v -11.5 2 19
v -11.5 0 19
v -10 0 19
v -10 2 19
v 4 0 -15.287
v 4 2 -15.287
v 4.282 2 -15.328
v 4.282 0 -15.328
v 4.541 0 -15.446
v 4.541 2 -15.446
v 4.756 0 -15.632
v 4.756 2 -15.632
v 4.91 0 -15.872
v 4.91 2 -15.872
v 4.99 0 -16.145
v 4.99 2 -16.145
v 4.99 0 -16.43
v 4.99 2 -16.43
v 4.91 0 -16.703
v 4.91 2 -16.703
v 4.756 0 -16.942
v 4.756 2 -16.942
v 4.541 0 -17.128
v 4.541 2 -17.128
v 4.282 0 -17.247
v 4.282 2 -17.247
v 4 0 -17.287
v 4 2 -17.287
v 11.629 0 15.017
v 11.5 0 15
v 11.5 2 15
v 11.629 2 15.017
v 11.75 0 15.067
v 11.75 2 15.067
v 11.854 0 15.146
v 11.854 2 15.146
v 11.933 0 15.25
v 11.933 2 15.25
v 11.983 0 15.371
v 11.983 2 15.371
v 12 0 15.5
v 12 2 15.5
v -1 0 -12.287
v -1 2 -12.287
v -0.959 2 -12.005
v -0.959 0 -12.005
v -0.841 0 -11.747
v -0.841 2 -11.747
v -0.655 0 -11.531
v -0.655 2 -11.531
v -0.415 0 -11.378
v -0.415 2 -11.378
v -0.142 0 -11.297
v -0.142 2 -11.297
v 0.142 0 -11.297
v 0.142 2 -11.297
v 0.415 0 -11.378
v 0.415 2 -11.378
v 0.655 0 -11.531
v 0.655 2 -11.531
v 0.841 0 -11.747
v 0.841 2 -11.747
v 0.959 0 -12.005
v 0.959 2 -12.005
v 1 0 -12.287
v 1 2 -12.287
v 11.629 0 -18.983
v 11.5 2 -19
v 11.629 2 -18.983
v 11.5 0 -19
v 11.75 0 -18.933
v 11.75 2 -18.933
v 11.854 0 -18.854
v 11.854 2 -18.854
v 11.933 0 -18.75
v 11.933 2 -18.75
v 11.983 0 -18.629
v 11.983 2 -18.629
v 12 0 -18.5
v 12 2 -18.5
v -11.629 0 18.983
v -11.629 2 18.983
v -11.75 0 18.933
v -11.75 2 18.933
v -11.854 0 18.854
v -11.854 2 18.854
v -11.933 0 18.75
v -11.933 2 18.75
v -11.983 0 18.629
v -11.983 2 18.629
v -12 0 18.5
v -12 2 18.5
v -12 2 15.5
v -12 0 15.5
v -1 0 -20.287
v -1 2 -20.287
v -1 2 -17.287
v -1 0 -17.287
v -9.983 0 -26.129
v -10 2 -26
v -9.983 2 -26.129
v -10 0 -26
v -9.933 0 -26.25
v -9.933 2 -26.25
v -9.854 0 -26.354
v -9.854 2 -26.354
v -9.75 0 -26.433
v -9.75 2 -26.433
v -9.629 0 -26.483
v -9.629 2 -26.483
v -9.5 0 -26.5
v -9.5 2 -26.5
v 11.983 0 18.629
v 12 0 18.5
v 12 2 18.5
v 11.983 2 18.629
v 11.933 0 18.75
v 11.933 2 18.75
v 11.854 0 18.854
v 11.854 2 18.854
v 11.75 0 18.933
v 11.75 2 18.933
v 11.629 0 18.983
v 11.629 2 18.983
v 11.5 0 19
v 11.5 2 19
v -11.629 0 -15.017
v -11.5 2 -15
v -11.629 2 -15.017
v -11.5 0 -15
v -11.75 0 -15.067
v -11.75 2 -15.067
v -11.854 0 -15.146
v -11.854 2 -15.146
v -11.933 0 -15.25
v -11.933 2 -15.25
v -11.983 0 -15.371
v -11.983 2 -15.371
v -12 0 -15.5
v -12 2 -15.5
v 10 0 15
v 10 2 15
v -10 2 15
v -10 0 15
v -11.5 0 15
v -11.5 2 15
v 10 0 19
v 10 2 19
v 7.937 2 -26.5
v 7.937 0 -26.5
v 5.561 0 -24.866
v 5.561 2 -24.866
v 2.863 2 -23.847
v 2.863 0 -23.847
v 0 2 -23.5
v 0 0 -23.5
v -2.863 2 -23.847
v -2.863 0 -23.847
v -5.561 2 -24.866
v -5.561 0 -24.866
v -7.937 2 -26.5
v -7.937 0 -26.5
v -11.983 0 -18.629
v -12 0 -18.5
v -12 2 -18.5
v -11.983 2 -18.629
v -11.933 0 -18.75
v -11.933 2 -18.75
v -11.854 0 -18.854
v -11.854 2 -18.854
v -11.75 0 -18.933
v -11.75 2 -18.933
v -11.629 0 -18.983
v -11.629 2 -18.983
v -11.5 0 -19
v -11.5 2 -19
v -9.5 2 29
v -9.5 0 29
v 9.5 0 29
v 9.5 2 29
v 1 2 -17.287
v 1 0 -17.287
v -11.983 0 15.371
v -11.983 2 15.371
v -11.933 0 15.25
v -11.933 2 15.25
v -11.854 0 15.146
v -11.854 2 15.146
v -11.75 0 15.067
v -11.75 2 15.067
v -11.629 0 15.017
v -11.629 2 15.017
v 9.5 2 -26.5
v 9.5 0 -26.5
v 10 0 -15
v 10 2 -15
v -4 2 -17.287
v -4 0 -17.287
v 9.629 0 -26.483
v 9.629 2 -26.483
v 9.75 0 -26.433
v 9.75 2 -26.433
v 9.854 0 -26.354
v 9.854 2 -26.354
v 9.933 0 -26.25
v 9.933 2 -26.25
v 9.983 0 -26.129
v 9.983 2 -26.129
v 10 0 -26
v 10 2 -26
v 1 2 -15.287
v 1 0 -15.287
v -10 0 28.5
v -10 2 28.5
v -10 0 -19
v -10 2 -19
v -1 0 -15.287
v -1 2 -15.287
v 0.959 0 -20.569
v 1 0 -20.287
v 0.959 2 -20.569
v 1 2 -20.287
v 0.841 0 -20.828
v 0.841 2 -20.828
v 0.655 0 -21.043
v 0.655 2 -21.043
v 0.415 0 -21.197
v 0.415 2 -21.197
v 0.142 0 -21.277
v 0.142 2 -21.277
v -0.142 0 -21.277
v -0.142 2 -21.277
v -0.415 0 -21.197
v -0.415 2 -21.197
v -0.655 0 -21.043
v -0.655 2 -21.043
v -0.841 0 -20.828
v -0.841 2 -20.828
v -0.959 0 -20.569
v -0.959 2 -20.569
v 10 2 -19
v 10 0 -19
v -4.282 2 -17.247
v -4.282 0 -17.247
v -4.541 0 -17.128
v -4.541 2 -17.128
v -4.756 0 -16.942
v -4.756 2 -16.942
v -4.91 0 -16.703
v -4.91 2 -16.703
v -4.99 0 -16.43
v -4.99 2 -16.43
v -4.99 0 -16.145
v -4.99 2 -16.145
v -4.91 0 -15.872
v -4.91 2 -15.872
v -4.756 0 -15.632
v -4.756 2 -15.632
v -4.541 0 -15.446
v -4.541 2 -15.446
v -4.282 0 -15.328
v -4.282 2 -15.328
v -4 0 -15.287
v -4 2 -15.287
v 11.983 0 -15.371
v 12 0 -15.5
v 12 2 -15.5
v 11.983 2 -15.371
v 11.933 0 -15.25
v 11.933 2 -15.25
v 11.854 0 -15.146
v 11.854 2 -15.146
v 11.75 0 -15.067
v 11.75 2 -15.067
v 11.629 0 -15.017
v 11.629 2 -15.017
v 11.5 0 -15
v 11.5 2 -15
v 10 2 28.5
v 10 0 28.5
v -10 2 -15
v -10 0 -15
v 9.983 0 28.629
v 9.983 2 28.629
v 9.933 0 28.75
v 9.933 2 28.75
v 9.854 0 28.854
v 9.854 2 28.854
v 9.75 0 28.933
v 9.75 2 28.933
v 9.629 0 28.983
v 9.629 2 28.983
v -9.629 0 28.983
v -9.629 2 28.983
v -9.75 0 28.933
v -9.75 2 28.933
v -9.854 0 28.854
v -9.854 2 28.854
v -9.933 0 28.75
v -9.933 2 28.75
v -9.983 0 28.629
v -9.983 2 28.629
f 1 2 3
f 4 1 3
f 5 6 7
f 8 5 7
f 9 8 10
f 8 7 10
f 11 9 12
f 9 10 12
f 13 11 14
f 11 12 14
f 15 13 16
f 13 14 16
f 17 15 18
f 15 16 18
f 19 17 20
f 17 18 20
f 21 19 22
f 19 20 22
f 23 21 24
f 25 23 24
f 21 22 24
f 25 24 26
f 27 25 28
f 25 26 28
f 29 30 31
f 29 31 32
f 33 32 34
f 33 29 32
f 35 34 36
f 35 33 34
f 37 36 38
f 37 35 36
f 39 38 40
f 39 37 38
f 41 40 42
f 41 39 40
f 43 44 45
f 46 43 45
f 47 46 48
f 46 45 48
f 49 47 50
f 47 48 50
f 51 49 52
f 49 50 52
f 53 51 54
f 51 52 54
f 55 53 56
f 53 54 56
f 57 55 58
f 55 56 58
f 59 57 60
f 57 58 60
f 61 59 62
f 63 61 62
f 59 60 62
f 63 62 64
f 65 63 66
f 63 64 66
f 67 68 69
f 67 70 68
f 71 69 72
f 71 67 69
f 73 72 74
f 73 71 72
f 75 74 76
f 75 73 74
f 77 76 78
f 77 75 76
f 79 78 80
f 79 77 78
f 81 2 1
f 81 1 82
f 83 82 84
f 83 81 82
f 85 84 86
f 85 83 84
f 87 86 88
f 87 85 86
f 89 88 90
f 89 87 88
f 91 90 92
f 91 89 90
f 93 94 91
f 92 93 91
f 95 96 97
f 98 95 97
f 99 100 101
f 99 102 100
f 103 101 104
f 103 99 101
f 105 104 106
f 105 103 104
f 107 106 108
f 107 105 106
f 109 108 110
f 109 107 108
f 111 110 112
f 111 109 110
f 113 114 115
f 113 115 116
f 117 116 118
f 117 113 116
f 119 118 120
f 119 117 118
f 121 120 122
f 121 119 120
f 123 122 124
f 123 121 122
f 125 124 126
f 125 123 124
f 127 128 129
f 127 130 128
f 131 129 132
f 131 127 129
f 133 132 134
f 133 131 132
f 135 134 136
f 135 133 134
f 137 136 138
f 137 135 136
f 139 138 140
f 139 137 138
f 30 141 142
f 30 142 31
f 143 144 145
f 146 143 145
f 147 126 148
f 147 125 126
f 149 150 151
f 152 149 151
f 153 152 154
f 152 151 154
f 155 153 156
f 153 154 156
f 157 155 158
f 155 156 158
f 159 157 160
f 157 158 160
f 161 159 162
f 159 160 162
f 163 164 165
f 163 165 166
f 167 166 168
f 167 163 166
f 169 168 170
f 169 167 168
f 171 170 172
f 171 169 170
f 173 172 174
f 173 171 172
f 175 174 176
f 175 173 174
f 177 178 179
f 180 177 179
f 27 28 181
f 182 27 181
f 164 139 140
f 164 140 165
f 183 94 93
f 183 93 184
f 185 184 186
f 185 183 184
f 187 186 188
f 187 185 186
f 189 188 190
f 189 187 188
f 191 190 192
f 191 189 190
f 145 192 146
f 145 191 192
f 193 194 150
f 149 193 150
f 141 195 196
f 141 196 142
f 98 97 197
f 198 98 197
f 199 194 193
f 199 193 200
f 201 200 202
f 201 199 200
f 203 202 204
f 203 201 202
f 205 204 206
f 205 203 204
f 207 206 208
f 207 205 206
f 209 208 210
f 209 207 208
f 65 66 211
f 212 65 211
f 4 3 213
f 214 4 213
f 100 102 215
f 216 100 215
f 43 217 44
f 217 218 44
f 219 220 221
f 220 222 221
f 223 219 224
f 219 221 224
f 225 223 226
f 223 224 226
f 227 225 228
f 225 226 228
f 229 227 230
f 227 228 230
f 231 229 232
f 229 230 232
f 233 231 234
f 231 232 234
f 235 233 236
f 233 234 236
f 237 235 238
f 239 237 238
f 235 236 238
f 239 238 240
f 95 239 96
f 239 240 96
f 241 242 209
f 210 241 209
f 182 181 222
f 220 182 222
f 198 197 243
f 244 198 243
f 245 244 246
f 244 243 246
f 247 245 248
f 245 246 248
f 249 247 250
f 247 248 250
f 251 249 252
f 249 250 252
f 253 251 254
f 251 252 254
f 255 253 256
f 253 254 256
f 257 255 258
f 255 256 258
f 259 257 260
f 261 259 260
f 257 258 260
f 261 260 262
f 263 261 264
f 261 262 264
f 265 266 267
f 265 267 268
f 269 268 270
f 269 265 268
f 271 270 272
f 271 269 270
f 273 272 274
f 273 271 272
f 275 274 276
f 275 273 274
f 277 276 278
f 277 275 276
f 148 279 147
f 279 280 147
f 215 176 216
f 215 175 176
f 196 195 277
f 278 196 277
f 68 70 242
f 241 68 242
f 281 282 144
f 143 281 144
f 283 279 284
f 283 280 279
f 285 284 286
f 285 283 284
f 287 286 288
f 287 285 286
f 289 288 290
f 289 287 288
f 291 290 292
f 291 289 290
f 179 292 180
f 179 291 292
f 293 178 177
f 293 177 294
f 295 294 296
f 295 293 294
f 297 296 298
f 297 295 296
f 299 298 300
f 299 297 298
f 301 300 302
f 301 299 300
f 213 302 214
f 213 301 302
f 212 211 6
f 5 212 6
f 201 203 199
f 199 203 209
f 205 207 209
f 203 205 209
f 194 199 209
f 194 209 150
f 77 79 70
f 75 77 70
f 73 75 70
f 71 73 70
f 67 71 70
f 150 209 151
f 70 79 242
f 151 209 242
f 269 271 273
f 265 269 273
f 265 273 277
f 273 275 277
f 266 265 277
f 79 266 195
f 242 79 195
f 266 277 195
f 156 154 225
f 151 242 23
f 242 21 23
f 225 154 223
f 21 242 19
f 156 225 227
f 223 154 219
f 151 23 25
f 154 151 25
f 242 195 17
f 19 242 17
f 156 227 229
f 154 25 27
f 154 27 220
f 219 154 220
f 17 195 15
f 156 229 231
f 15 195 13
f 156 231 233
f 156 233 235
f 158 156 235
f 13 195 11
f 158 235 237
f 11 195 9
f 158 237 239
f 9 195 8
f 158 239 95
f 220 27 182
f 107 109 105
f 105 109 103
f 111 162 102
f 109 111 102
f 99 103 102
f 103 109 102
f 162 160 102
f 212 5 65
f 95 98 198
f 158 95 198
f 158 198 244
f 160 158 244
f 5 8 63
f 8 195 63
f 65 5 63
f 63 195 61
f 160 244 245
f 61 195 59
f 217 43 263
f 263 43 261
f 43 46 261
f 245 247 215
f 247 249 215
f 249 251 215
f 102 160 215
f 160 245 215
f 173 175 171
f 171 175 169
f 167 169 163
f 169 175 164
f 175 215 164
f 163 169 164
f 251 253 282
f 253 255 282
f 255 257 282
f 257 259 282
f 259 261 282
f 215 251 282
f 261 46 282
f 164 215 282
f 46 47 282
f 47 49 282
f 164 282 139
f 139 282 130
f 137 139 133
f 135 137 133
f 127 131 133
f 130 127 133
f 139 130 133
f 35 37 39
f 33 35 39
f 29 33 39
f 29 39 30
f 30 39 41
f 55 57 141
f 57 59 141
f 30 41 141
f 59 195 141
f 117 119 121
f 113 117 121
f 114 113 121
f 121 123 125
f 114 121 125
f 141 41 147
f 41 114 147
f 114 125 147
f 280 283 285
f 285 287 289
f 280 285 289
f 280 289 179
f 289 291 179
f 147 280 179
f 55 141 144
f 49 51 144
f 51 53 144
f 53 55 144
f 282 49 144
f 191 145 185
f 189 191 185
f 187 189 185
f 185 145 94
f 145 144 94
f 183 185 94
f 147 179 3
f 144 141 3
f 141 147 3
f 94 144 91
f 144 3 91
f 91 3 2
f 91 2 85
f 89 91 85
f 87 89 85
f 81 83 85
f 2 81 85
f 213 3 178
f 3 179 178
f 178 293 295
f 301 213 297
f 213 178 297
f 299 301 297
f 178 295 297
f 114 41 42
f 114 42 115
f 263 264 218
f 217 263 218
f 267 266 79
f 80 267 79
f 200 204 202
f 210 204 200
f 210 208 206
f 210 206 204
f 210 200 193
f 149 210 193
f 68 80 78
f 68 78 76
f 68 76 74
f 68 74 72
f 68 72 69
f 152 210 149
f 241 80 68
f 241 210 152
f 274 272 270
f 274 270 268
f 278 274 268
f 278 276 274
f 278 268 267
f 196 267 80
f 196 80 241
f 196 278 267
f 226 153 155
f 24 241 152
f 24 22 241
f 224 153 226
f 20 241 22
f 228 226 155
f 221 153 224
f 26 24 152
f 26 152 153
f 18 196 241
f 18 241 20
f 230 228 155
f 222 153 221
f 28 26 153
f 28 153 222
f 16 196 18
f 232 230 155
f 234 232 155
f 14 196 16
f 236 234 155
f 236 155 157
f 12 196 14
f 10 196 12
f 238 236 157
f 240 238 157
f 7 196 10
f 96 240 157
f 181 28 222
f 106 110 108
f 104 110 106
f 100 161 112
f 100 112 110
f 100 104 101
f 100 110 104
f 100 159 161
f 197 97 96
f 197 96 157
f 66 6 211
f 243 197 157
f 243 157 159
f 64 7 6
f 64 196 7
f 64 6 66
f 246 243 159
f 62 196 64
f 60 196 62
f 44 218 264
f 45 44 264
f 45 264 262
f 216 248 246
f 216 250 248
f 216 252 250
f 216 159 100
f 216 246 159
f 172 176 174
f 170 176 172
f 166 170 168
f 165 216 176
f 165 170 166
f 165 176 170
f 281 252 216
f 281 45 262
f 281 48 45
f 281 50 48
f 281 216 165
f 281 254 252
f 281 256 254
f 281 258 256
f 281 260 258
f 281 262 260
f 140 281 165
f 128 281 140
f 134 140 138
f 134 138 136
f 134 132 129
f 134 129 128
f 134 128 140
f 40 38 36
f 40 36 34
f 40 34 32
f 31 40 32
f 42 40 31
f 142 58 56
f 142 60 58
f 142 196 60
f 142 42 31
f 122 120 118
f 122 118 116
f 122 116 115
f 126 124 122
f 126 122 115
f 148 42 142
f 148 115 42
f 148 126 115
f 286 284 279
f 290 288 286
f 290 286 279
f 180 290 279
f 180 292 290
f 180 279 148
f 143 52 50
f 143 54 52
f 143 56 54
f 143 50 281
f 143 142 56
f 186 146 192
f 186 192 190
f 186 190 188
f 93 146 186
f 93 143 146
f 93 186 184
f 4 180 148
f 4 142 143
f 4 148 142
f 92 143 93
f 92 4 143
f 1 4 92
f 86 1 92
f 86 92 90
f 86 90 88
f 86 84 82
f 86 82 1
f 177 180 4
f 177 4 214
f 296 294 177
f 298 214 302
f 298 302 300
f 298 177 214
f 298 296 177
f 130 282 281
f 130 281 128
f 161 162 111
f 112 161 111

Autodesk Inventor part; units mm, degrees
ref_plane "YZ Plane" through (0, 0, 0) normal (1, 0, 0) x (0, 1, 0)
ref_plane "XZ Plane" through (0, 0, 0) normal (0, 1, 0) x (-1, 0, 0)
ref_plane "XY Plane" through (0, 0, 0) normal (0, 0, 1) x (1, 0, 0)
sketch "Sketch1" plane through (0, 0, 0) normal (0, 1, 0) x (-1, 0, 0)
  line L0 (9.5, 29) -> (-9.5, 29)
  line L1 (-9.5, -26.5) -> (-7.9373, -26.5)
  line L2 (10, 0) -> (10, 15)
  line L3 (10, 15) -> (11.5, 15)
  line L4 (12, 15.5) -> (12, 18.5)
  line L5 (11.5, 19) -> (10, 19)
  line L6 (10, 0) -> (10, -15)
  line L7 (10, -15) -> (11.5, -15)
  line L8 (12, -15.5) -> (12, -18.5)
  line L9 (11.5, -19) -> (10, -19)
  line L10 (-10, 0) -> (-10, 15)
  line L11 (-10, 15) -> (-11.5, 15)
  line L12 (-12, 15.5) -> (-12, 18.5)
  line L13 (-11.5, 19) -> (-10, 19)
  line L14 (-10, 0) -> (-10, -15)
  line L15 (-10, -15) -> (-11.5, -15)
  line L16 (-12, -15.5) -> (-12, -18.5)
  line L17 (-11.5, -19) -> (-10, -19)
  line L18 (10, 19) -> (10, 28.5)
  line L19 (10, -19.5) -> (10, -19)
  line L20 (10, -15) -> (10, 15)
  line L21 (-10, -19) -> (-10, -19.5)
  line L22 (-10, 28.5) -> (-10, 19)
  line L23 (-10, 15) -> (-10, -15)
  arc A0 (11.5, 15) -> (12, 15.5) centre (11.5, 15.5) ccw
  arc A1 (12, 18.5) -> (11.5, 19) centre (11.5, 18.5) ccw
  arc A2 (-11.5, 19) -> (-12, 18.5) centre (-11.5, 18.5) ccw
  arc A3 (-12, 15.5) -> (-11.5, 15) centre (-11.5, 15.5) ccw
  arc A4 (12, -15.5) -> (11.5, -15) centre (11.5, -15.5) ccw
  arc A5 (11.5, -19) -> (12, -18.5) centre (11.5, -18.5) ccw
  arc A6 (-11.5, -15) -> (-12, -15.5) centre (-11.5, -15.5) ccw
  arc A7 (-12, -18.5) -> (-11.5, -19) centre (-11.5, -18.5) ccw
  line L24 (0, -26.5) -> (0, -35.5) construction
  arc A8 (7.9373, -26.5) -> (-7.9373, -26.5) centre (0, -35.5) ccw
  arc A9 (10, 28.5) -> (9.5, 29) centre (9.5, 28.5) ccw
  arc A10 (-9.5, 29) -> (-10, 28.5) centre (-9.5, 28.5) ccw
  line L25 (7.9373, -26.5) -> (9.5, -26.5)
  line L26 (-7.9373, -26.5) -> (7.9373, -26.5) construction
  line L27 (0, -26.5) -> (0, -26.5) construction
  line L28 (10, -19.5) -> (10, -26)
  line L29 (9.5, -26.5) -> (9.5, -26.5)
  line L30 (-10, -19.5) -> (-10, -26)
  line L31 (-9.5, -26.5) -> (-9.5, -26.5)
  arc A11 (9.5, -26.5) -> (10, -26) centre (9.5, -26) ccw
  arc A12 (-10, -26) -> (-9.5, -26.5) centre (-9.5, -26) ccw
  line L32 (0, 29) -> (0, 29) construction
  point P0 (0, 0)
  point P1 (12, 15)
  point P2 (12, 19)
  point P3 (12, -15)
  point P4 (12, -19)
  point P5 (-12, 15)
  point P6 (-12, 19)
  point P7 (-12, -15)
  point P8 (-12, -19)
  point P9 (-10, -26.5)
  dimension "d2" = 15
  dimension "d3" = 2
  dimension "d4" = 4
  dimension "d5" = 15
  dimension "d6" = 4
  dimension "d7" = 15
  dimension "d8" = 2
  dimension "d9" = 4
  dimension "d10" = 15
  dimension "d11" = 4
  dimension "d12" = 0.5
  dimension "d13" = 9
  dimension "d14" = 12
  dimension "d15" = 0.5
  dimension "d26" = 0
  dimension "d27" = 0.5
  dimension "d28" = 0
extrude "Extrusion1" add sketch "Sketch1" along normal blind 2
sketch "Sketch2" plane through (0, 2, 0) normal (0, 1, 0) x (1, 0, 0)
  line L0 (-4, 16.2872) -> (4, 16.2872) construction
  line L1 (-4, 15.2872) -> (4, 15.2872)
  line L2 (4, 17.2872) -> (-4, 17.2872)
  arc A0 (-4, 17.2872) -> (-4, 15.2872) centre (-4, 16.2872) ccw
  arc A1 (4, 15.2872) -> (4, 17.2872) centre (4, 16.2872) ccw
  line L3 (0, 20.2872) -> (0, 12.2872) construction
  line L4 (-1, 20.2872) -> (-1, 12.2872)
  line L5 (1, 12.2872) -> (1, 20.2872)
  arc A2 (1, 20.2872) -> (-1, 20.2872) centre (0, 20.2872) ccw
  arc A3 (-1, 12.2872) -> (1, 12.2872) centre (0, 12.2872) ccw
  line L6 (0, 16.2872) -> (0, 21.2872) construction
  point P0 (0, 0)
  point P1 (-1, 15.2872)
  point P2 (1, 15.2872)
  point P3 (1, 17.2872)
  point P4 (-1, 17.2872)
  point P5 (0, 21.2872)
  dimension "d18" = 4
  dimension "d19" = 2
  dimension "d20" = 4
  dimension "d21" = 2
  dimension "d29" = 5
extrude "Extrusion2" cut sketch "Sketch2" against normal blind 2
properties part number "Laser-Slot-Top" material "Acrylic, Clear"
